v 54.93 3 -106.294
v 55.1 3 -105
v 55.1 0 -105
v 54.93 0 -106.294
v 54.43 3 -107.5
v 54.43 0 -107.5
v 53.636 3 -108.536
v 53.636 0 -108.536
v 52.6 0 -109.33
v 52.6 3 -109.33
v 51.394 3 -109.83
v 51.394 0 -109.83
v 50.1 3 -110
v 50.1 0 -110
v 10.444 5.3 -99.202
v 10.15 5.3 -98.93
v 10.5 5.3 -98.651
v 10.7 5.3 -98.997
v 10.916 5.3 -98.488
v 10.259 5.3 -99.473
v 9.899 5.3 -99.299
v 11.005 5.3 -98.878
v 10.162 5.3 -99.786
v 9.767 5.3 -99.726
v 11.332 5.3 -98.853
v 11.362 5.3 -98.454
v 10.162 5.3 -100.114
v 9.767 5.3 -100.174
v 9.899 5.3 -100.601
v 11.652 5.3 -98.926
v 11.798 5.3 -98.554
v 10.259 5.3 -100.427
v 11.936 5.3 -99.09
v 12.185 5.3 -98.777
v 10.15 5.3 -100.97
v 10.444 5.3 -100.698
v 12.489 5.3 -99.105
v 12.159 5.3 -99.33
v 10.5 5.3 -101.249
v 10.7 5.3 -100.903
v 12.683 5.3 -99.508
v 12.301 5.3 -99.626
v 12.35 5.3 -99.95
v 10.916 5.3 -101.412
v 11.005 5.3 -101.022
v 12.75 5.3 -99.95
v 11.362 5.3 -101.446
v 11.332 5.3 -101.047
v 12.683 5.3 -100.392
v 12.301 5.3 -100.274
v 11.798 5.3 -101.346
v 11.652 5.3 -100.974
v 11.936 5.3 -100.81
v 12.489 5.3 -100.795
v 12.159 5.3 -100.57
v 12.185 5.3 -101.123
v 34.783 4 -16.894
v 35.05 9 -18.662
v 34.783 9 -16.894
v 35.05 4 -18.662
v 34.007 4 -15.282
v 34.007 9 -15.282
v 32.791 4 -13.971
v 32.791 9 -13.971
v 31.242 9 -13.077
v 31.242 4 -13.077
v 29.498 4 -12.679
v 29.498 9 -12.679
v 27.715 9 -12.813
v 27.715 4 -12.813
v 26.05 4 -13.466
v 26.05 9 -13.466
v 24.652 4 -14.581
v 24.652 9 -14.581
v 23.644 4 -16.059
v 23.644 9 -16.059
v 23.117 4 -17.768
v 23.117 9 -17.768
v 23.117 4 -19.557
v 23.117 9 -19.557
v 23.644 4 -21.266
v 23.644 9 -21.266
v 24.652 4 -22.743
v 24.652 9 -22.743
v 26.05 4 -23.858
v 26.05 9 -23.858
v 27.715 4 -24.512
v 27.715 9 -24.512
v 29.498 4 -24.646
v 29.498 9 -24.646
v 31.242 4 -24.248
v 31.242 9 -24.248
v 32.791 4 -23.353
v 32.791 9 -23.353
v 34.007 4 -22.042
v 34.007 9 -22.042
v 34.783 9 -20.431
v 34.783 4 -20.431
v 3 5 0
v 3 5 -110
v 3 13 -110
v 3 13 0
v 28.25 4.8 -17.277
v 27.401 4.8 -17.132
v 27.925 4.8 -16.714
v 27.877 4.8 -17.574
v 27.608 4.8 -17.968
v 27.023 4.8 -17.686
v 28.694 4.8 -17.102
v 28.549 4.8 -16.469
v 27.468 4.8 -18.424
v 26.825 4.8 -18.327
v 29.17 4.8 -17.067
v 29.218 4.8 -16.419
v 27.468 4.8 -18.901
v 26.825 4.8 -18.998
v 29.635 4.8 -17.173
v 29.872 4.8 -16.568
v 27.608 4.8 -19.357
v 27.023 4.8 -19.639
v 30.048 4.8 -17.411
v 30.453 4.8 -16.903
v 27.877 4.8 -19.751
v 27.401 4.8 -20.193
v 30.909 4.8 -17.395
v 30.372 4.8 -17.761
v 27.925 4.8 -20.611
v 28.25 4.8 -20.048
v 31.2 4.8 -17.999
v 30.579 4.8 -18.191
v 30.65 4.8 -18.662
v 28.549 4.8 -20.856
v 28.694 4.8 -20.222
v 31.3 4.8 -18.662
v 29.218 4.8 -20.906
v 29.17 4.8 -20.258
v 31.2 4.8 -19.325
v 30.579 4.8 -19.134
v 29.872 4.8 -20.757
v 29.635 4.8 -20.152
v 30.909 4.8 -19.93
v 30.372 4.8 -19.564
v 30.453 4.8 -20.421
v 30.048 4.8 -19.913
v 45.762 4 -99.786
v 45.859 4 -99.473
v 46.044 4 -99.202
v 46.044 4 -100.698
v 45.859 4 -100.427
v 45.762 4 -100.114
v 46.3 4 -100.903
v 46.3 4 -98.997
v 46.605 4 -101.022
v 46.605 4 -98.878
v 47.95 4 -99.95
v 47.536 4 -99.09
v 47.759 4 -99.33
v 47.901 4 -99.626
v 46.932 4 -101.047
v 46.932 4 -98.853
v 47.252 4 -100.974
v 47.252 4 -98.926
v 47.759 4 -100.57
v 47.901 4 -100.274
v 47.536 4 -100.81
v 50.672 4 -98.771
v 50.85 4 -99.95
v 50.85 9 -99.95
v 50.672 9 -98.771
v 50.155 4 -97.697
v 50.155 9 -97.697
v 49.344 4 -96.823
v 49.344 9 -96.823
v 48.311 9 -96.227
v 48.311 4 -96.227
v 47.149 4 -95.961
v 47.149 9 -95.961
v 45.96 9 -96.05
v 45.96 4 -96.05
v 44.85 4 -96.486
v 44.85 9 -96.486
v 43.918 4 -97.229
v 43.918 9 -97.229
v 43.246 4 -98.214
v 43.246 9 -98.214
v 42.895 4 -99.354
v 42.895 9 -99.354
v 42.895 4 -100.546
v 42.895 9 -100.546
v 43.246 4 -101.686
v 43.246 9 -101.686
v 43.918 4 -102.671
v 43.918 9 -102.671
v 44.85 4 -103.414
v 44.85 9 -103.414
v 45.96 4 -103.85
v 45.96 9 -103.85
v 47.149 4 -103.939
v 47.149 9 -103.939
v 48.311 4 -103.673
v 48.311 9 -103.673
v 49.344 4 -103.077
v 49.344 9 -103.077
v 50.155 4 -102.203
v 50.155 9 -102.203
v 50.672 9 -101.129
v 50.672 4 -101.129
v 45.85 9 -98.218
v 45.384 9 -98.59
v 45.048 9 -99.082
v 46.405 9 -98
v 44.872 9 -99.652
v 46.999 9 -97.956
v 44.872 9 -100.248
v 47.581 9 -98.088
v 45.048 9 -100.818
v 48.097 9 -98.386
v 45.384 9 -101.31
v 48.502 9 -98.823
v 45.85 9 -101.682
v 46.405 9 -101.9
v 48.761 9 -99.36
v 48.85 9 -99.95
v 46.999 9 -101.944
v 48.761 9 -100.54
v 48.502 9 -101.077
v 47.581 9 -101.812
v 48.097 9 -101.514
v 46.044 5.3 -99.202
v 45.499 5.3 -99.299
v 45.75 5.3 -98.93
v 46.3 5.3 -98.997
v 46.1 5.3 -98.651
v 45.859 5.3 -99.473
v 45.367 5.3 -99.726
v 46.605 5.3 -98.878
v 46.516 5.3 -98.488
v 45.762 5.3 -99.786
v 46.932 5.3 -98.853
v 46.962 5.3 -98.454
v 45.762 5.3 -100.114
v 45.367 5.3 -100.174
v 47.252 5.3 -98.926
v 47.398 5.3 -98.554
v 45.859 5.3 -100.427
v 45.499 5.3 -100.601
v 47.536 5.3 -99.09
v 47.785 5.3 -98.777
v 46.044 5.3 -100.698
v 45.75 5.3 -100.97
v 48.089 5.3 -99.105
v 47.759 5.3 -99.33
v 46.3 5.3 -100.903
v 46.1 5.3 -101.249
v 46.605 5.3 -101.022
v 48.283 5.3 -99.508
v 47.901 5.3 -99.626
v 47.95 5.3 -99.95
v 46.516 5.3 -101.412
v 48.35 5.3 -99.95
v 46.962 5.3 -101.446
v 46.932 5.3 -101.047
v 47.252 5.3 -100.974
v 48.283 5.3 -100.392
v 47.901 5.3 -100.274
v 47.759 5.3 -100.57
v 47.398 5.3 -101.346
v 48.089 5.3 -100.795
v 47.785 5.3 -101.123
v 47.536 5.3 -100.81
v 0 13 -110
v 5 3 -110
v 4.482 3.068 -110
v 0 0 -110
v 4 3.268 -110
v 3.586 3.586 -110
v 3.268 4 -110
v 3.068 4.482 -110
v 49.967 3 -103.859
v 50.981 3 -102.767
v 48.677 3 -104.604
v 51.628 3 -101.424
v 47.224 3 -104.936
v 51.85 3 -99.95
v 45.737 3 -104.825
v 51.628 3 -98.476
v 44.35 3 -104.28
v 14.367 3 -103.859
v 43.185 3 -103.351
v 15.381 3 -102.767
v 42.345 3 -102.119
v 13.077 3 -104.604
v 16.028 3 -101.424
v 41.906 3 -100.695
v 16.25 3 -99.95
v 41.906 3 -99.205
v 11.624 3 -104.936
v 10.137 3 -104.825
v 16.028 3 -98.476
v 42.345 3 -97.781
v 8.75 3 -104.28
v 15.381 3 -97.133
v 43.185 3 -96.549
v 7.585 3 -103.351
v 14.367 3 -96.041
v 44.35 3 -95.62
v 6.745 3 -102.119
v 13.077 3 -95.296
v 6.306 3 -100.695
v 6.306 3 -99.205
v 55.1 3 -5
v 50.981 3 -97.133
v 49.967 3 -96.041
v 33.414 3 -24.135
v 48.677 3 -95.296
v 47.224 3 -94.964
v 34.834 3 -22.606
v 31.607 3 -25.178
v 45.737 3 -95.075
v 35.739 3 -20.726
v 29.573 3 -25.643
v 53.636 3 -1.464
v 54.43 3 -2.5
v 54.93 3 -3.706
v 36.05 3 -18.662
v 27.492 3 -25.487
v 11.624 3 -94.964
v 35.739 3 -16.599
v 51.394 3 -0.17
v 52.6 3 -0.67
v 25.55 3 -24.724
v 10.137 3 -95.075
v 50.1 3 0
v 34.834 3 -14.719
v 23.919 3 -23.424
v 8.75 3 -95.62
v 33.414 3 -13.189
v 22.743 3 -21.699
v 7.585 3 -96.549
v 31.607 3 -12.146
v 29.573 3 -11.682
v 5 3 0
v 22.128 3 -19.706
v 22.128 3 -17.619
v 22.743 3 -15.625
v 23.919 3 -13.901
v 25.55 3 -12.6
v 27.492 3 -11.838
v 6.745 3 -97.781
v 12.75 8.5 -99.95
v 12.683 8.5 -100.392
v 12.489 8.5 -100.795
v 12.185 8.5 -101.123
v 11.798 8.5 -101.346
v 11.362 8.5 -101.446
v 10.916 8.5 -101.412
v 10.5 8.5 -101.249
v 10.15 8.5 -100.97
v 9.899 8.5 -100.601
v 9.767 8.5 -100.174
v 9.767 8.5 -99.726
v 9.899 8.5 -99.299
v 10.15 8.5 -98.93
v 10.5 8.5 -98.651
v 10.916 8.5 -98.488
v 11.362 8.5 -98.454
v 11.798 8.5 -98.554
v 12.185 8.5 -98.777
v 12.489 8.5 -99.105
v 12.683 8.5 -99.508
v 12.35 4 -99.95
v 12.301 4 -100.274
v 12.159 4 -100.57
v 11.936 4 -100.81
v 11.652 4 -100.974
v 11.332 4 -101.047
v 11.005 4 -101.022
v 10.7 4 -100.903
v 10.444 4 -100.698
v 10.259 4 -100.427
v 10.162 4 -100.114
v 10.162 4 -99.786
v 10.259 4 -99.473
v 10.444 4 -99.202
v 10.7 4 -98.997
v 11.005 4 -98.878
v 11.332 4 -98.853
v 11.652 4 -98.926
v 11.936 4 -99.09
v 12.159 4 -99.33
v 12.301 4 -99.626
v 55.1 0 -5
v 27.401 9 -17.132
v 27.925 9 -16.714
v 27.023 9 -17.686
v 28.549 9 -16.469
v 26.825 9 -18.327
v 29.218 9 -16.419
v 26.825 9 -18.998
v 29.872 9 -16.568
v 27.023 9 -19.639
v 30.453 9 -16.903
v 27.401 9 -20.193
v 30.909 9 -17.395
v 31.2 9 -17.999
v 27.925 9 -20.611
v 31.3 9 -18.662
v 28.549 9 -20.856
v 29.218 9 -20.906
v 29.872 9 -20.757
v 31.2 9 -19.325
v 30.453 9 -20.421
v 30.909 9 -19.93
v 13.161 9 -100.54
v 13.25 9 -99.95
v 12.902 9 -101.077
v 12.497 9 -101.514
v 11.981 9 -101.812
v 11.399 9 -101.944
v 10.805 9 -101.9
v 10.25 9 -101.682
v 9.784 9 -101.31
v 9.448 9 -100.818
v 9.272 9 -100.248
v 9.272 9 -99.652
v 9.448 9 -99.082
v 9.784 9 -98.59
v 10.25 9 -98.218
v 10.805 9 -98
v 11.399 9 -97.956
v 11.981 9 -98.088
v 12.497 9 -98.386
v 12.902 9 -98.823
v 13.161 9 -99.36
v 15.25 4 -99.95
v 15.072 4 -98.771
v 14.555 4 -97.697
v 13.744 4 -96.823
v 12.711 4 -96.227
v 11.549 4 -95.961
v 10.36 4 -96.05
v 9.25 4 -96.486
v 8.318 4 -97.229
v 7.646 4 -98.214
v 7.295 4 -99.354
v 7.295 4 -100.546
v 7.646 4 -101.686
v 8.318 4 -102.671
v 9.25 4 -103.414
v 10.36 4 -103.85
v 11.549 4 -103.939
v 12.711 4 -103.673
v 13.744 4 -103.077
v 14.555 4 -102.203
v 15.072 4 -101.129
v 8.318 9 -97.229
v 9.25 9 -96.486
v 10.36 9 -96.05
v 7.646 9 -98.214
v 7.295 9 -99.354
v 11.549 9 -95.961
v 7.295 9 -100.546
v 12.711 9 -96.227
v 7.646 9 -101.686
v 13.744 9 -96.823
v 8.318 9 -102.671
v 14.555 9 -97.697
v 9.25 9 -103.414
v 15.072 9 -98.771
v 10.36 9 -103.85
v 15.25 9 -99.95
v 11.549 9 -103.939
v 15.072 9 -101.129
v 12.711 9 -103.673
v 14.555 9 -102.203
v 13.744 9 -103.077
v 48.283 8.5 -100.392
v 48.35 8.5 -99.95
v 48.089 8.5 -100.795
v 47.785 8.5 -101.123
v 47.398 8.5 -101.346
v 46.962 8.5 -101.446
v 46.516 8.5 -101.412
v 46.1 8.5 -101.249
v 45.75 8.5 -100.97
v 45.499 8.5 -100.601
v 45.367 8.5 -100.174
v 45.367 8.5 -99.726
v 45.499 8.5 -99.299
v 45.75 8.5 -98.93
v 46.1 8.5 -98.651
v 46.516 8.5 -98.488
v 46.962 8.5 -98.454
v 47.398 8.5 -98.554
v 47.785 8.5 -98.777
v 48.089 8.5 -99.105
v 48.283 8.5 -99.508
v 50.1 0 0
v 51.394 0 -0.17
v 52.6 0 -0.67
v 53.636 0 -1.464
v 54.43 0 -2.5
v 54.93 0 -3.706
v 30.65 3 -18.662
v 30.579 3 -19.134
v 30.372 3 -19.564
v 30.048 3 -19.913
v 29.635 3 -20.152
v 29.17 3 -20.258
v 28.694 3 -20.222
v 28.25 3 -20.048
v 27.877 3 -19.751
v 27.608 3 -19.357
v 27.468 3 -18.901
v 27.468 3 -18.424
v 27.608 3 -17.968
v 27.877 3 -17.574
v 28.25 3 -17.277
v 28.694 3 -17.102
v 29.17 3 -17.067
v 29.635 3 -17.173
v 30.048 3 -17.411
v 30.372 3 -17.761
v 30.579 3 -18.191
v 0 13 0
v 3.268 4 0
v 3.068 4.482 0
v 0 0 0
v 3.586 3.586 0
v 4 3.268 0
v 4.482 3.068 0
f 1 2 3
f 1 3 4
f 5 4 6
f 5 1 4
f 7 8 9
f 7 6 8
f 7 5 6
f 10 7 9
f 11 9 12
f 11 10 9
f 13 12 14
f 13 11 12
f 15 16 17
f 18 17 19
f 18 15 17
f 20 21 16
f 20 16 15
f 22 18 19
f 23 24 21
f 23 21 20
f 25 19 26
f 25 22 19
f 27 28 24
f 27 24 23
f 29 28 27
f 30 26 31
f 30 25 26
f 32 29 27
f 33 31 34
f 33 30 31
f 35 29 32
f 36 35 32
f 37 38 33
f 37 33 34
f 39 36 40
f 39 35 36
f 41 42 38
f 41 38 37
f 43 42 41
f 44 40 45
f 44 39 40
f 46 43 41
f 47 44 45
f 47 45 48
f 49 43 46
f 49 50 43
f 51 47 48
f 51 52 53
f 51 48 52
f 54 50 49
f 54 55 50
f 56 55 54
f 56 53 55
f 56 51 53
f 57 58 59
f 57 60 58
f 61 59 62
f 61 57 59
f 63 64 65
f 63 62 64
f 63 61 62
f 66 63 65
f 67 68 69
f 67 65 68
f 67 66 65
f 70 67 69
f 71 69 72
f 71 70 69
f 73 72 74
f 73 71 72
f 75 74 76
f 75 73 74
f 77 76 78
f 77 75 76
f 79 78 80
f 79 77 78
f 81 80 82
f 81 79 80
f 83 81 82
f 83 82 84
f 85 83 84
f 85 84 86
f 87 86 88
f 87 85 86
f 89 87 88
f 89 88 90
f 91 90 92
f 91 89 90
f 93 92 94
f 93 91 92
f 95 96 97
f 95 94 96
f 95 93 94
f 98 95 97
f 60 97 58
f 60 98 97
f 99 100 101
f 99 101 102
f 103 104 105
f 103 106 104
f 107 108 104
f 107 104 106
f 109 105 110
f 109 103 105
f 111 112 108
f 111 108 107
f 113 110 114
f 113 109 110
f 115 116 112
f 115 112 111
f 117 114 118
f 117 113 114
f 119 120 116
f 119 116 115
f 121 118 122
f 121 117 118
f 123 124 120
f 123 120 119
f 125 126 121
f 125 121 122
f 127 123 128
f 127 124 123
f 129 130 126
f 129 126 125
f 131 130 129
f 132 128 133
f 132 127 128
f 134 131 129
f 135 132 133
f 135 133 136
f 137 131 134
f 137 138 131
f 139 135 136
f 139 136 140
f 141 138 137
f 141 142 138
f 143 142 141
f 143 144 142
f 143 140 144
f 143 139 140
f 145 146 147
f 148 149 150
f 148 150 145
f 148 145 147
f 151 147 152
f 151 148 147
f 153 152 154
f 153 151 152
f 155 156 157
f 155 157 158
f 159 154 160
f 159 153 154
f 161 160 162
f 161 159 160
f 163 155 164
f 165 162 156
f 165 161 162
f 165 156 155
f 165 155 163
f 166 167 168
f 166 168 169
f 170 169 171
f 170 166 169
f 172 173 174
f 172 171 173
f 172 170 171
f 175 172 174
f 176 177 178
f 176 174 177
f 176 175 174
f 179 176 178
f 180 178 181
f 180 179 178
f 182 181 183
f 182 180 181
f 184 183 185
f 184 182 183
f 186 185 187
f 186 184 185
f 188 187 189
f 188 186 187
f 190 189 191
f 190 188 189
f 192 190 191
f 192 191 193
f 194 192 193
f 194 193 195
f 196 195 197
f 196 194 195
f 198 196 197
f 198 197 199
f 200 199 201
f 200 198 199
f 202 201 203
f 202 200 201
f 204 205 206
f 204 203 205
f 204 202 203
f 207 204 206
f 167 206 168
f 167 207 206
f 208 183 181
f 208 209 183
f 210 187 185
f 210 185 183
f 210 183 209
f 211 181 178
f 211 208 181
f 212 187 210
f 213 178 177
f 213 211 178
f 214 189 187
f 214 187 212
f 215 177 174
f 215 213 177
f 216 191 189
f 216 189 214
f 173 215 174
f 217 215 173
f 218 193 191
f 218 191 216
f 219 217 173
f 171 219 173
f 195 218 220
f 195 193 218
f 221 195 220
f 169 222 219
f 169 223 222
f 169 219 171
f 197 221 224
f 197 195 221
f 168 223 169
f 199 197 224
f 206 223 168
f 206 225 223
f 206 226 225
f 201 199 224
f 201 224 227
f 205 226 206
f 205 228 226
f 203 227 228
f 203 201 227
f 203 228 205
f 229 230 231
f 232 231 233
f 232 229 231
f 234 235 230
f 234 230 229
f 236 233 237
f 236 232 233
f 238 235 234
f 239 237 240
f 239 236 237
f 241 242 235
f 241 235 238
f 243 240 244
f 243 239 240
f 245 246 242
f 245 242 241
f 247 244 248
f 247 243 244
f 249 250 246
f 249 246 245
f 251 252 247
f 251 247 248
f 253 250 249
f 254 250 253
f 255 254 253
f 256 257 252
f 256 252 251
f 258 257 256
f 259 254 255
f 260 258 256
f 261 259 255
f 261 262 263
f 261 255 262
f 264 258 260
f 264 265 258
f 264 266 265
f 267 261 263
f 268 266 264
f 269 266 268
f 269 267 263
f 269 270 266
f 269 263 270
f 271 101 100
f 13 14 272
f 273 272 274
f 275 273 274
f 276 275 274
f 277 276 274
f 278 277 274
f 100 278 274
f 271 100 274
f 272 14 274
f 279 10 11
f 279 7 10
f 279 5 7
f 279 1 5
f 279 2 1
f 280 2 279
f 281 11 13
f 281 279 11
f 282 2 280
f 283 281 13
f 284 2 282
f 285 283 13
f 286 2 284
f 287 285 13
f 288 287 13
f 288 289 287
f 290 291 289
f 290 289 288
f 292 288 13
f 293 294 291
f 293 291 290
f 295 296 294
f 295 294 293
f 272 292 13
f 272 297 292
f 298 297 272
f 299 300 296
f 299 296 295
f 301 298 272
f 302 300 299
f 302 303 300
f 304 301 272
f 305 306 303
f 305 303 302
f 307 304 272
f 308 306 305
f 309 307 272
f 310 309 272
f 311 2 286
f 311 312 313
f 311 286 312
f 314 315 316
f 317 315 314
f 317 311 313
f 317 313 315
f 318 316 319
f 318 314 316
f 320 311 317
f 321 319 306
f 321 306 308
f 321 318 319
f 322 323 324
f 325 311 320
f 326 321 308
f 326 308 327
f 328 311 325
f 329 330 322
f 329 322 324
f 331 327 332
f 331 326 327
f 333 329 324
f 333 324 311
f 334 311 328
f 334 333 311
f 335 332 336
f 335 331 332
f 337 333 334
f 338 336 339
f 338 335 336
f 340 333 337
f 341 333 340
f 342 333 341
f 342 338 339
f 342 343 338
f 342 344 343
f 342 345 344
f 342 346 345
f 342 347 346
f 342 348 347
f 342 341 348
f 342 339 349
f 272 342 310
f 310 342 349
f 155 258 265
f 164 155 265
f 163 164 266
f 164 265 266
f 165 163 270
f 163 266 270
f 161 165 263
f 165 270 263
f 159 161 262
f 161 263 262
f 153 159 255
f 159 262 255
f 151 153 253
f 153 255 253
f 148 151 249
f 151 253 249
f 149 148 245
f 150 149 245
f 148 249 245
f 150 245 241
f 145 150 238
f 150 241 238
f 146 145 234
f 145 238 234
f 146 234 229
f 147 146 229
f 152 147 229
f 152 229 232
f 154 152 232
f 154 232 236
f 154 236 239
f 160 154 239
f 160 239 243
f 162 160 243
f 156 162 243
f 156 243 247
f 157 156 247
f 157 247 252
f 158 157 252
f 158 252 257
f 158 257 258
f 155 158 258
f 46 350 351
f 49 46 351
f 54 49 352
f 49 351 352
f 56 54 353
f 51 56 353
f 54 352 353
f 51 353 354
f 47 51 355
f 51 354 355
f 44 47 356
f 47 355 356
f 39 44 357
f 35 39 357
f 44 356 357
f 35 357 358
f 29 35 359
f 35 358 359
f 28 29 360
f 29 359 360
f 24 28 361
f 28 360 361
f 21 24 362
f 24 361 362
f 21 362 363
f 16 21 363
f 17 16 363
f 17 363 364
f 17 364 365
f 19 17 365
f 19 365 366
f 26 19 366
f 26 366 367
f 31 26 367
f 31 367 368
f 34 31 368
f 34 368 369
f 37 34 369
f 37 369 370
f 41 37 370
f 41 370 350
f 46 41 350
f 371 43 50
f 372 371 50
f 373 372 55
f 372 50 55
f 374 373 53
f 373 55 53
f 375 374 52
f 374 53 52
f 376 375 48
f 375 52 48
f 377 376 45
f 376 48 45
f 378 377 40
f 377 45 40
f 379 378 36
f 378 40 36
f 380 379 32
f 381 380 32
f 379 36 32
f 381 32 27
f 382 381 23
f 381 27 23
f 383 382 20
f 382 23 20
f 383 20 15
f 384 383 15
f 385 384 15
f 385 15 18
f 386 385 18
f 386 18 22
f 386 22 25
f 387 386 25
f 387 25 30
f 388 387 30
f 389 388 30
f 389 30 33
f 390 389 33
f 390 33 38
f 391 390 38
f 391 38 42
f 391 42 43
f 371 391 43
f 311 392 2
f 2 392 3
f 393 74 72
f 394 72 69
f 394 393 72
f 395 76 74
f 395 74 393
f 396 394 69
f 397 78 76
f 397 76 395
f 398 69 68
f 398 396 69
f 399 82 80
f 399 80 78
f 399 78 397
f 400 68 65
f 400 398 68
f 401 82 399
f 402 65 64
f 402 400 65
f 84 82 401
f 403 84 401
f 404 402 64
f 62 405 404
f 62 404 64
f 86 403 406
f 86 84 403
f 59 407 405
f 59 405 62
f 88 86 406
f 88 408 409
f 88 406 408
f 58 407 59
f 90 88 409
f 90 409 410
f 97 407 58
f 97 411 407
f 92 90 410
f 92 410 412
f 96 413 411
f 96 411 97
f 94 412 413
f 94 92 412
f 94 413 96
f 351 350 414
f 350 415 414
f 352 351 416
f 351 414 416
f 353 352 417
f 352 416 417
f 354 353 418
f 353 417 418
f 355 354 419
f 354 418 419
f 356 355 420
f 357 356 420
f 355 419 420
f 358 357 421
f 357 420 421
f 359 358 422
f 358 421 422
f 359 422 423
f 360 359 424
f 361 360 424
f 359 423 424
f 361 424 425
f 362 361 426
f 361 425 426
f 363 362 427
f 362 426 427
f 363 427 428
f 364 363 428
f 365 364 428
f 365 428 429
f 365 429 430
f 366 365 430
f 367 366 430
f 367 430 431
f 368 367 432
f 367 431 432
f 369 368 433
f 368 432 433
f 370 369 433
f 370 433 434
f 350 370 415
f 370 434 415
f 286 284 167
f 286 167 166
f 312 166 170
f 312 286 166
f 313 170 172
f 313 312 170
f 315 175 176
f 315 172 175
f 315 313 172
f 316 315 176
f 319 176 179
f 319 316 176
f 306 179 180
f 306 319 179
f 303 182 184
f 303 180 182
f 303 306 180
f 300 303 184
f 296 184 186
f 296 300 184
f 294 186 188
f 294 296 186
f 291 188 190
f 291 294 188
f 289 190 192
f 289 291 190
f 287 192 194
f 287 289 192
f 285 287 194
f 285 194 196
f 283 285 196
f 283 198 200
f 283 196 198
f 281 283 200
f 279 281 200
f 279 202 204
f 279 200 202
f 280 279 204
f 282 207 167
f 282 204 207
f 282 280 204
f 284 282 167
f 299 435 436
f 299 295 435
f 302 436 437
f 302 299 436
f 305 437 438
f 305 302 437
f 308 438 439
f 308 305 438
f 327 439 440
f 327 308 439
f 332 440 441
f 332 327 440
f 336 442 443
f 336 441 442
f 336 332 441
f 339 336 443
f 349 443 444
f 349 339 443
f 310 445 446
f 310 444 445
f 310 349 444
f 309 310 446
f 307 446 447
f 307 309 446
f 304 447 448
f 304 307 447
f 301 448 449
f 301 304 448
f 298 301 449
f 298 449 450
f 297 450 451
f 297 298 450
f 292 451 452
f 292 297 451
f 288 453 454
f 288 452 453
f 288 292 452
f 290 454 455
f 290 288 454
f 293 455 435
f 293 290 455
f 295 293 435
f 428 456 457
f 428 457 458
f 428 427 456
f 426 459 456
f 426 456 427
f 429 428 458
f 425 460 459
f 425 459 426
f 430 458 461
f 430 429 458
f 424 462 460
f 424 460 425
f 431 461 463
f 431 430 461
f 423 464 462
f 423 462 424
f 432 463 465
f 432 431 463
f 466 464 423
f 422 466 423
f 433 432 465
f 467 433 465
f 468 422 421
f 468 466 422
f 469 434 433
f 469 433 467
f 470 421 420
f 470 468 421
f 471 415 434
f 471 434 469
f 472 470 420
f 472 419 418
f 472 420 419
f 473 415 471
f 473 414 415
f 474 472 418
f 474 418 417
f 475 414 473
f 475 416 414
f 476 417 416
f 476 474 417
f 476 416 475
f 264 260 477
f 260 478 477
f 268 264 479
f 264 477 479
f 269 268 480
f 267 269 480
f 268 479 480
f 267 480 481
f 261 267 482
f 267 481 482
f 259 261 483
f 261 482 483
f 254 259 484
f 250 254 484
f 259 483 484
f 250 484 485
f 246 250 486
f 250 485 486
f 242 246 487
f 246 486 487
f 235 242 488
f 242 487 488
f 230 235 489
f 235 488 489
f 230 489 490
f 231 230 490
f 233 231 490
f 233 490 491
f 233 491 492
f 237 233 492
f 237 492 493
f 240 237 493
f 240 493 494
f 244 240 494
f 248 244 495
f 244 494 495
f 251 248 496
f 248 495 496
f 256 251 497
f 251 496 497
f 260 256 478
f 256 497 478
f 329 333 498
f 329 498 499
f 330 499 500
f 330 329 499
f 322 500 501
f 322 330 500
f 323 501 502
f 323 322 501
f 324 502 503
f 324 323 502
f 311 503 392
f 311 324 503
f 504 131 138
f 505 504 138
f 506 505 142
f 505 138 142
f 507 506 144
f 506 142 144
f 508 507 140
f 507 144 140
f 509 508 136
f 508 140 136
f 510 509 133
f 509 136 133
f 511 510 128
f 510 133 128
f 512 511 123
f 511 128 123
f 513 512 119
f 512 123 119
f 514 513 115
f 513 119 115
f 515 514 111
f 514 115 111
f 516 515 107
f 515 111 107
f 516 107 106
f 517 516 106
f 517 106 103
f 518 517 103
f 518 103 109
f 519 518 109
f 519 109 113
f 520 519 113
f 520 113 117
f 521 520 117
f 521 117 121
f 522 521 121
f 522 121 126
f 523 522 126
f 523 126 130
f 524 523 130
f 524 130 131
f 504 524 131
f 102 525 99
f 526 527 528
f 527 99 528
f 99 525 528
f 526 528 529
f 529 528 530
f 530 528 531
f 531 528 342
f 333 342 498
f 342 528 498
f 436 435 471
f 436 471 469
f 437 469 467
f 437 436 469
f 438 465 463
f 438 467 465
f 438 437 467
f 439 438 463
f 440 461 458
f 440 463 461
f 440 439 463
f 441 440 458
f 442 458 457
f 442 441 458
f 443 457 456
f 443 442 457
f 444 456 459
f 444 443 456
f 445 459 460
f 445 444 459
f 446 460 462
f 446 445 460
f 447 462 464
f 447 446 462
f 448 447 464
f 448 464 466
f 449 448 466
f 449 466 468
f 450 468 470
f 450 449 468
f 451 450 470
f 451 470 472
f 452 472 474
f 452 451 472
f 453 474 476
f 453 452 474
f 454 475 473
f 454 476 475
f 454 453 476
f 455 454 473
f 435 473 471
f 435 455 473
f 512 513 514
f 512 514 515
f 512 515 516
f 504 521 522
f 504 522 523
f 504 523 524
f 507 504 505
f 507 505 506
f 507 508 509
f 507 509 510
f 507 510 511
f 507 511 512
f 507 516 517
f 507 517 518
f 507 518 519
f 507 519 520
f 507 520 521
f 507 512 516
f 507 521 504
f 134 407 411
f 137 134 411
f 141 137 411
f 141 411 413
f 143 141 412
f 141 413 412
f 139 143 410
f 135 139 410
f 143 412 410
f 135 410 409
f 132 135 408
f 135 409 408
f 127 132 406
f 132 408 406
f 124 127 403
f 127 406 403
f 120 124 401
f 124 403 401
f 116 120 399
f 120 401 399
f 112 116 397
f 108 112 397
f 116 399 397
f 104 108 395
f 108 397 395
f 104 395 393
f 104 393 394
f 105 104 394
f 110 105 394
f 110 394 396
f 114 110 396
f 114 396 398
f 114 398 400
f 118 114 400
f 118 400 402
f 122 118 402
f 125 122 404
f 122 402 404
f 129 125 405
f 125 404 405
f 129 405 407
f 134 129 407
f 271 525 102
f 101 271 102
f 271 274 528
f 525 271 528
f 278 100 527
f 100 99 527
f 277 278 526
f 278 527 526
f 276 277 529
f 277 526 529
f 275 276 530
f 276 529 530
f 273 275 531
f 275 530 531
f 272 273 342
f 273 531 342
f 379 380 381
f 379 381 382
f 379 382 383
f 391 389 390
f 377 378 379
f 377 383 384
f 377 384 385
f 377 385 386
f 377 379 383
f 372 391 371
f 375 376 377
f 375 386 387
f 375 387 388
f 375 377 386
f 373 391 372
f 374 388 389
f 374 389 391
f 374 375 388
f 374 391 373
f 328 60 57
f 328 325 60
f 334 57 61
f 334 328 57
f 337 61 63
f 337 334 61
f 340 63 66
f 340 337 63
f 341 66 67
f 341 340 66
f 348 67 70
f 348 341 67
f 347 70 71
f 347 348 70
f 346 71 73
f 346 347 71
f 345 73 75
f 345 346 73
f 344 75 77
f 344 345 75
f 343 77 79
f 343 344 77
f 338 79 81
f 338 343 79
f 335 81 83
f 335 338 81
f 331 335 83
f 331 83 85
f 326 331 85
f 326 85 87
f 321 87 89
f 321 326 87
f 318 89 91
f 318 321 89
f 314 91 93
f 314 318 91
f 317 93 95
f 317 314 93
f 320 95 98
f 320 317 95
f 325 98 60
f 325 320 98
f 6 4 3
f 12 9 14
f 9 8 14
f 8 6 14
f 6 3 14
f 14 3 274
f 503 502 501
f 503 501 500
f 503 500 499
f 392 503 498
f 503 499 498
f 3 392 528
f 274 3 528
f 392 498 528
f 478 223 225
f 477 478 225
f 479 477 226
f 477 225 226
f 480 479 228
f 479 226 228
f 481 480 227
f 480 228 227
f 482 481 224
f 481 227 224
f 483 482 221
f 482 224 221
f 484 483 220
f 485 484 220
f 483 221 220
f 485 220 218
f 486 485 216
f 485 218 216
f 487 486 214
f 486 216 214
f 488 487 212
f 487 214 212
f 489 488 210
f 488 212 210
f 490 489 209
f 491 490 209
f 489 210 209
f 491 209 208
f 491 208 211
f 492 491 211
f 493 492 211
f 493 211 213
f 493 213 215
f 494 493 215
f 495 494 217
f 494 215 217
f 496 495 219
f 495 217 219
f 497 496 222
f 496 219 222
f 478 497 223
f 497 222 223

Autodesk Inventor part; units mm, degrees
ref_plane "YZ Plane" through (0, 0, 0) normal (1, 0, 0) x (0, 1, 0)
ref_plane "XZ Plane" through (0, 0, 0) normal (0, 1, 0) x (-1, 0, 0)
ref_plane "XY Plane" through (0, 0, 0) normal (0, 0, 1) x (1, 0, 0)
sketch "Sketch1" plane through (0, 0, 0) normal (0, 1, 0) x (-1, 0, 0)
  line L0 (0, 0) -> (-55.1, 0)
  line L1 (-55.1, 0) -> (-55.1, -110)
  line L2 (-55.1, -110) -> (0, -110)
  line L3 (0, -110) -> (0, 0)
  dimension "d0" = 110
  dimension "d28" = 55.1
extrude "Extrusion1" add sketch "Sketch1" along normal blind 3
sketch "Sketch2" plane through (0, 3, 0) normal (0, 1, 0) x (1, 0, 0)
  line L0 (55.1, 0) -> (55.1, 110) projected
  line L1 (55.1, 110) -> (0, 110) projected
  line L2 (0, 110) -> (0, 0) projected
  line L3 (0, 0) -> (55.1, 0) projected
  circle A0 centre (11.25, 99.95) radius 4
  circle A1 centre (46.85, 99.95) radius 4
  circle A2 centre (29.05, 18.6623) radius 6
  point P0 (27.55, 110)
  dimension "d3" = 8
  dimension "d4" = 10.05
  dimension "d6" = 8
  dimension "d7" = 10.05
  dimension "d8" = 8.25
  dimension "d29" = 12
  dimension "d30" = 91.35
  dimension "d39" = 26.05
  dimension "d40" = 35.6
extrude "Extrusion2" cut sketch "Sketch2" against normal blind 0.5 contours A0 | A1 | A2
sketch "Sketch3" plane through (11.25, 2.5, -99.95) normal (0, 1, 0) x (1, 0, 0)
  circle A0 centre (0, 0) radius 4 projected
  circle A1 centre (0, 0) radius 4
  circle A2 centre (35.6, 0) radius 4 projected
  circle A3 centre (35.6, 0) radius 4
  circle A4 centre (17.8, -81.2877) radius 6 projected
  circle A5 centre (17.8, -81.2877) radius 6
  point P0 (-11.25, -99.95)
  dimension "d32" = 12
extrude "Extrusion3" add sketch "Sketch3" along normal blind 6.5
sketch "Sketch4" plane through (11.25, 9, -99.95) normal (0, 1, 0) x (1, 0, 0)
  circle A0 centre (0, 0) radius 4 projected
  circle A1 centre (0, 0) radius 1.5
  circle A2 centre (35.6, 0) radius 4 projected
  circle A3 centre (35.6, 0) radius 1.5
  point P0 (-11.25, -99.95)
  dimension "d13" = 3
  dimension "d14" = 3
extrude "Extrusion4" cut sketch "Sketch4" against normal blind 3.7 contours A1 | A3
chamfer "Chamfer1" distance 1 angle 45 3 edges at (7.25, 3, -99.95) (42.85, 3, -99.95) (23.05, 3, -18.6623)
chamfer "Chamfer2" distance 0.5 angle 45 2 edges at (9.75, 9, -99.95) (45.35, 9, -99.95)
sketch "Sketch5" plane through (0, 3, 0) normal (0, 1, 0) x (1, 0, 0)
  circle A0 centre (11.25, 99.95) radius 1.5 projected
  point P0 (0, 0)
sketch "Sketch6" plane through (11.25, 5.3, -99.95) normal (0, 1, 0) x (1, 0, 0)
  circle A0 centre (0, 0) radius 1.5 projected
  circle A1 centre (0, 0) radius 1.1
  circle A2 centre (35.6, 0) radius 1.5 projected
  circle A3 centre (35.6, 0) radius 1.1
  point P0 (-11.25, -99.95)
  dimension "d23" = 2.2
  dimension "d24" = 2.2
extrude "Extrusion5" cut sketch "Sketch6" against normal blind 1.3 contours A1 | A3
sketch "Sketch7" plane through (29.05, 9, -18.6623) normal (0, 1, 0) x (1, 0, 0)
  circle A0 centre (0, 0) radius 2.25
  point P0 (-29.05, -18.6623)
  dimension "d33" = 4.5
extrude "Extrusion6" cut sketch "Sketch7" against normal blind 4.2
sketch "Sketch8" plane through (29.05, 4.8, -18.6623) normal (0, 1, 0) x (1, 0, 0)
  circle A0 centre (0, 0) radius 2.25 projected
  circle A1 centre (0, 0) radius 1.6
  point P0 (-29.05, -18.6623)
  dimension "d36" = 3.2
extrude "Extrusion7" cut sketch "Sketch8" against normal blind 1.8 contours A1
sketch "Sketch9" plane through (0, 3, 0) normal (0, 1, 0) x (1, 0, 0)
  circle A0 centre (46.85, 99.95) radius 5 projected
  line L0 (55.1, 0) -> (55.1, 110) projected
  line L1 (55.1, 110) -> (0, 110) projected
  line L2 (0, 110) -> (0, 0) projected
  line L3 (0, 0) -> (55.1, 0) projected
  circle A1 centre (11.25, 99.95) radius 5 projected
  circle A2 centre (29.05, 18.6623) radius 7 projected
  line L4 (55.1, 110) -> (0, 110) projected
  line L5 (0, 110) -> (3, 110)
  line L6 (3, 110) -> (3, 0)
  line L7 (3, 0) -> (0, 0)
  line L8 (0, 0) -> (0, 110)
  dimension "d41" = 3
extrude "Extrusion8" add sketch "Sketch9" along normal blind 10 contours L3 L2 L1 L6
fillet "Fillet2" radius 5 2 edges at (55.1, 1.5, -110) (55.1, 1.5, 0)
fillet "Fillet3" radius 2 1 edges at (3, 3, -55)
properties part number "long_protoboard_backplate"
